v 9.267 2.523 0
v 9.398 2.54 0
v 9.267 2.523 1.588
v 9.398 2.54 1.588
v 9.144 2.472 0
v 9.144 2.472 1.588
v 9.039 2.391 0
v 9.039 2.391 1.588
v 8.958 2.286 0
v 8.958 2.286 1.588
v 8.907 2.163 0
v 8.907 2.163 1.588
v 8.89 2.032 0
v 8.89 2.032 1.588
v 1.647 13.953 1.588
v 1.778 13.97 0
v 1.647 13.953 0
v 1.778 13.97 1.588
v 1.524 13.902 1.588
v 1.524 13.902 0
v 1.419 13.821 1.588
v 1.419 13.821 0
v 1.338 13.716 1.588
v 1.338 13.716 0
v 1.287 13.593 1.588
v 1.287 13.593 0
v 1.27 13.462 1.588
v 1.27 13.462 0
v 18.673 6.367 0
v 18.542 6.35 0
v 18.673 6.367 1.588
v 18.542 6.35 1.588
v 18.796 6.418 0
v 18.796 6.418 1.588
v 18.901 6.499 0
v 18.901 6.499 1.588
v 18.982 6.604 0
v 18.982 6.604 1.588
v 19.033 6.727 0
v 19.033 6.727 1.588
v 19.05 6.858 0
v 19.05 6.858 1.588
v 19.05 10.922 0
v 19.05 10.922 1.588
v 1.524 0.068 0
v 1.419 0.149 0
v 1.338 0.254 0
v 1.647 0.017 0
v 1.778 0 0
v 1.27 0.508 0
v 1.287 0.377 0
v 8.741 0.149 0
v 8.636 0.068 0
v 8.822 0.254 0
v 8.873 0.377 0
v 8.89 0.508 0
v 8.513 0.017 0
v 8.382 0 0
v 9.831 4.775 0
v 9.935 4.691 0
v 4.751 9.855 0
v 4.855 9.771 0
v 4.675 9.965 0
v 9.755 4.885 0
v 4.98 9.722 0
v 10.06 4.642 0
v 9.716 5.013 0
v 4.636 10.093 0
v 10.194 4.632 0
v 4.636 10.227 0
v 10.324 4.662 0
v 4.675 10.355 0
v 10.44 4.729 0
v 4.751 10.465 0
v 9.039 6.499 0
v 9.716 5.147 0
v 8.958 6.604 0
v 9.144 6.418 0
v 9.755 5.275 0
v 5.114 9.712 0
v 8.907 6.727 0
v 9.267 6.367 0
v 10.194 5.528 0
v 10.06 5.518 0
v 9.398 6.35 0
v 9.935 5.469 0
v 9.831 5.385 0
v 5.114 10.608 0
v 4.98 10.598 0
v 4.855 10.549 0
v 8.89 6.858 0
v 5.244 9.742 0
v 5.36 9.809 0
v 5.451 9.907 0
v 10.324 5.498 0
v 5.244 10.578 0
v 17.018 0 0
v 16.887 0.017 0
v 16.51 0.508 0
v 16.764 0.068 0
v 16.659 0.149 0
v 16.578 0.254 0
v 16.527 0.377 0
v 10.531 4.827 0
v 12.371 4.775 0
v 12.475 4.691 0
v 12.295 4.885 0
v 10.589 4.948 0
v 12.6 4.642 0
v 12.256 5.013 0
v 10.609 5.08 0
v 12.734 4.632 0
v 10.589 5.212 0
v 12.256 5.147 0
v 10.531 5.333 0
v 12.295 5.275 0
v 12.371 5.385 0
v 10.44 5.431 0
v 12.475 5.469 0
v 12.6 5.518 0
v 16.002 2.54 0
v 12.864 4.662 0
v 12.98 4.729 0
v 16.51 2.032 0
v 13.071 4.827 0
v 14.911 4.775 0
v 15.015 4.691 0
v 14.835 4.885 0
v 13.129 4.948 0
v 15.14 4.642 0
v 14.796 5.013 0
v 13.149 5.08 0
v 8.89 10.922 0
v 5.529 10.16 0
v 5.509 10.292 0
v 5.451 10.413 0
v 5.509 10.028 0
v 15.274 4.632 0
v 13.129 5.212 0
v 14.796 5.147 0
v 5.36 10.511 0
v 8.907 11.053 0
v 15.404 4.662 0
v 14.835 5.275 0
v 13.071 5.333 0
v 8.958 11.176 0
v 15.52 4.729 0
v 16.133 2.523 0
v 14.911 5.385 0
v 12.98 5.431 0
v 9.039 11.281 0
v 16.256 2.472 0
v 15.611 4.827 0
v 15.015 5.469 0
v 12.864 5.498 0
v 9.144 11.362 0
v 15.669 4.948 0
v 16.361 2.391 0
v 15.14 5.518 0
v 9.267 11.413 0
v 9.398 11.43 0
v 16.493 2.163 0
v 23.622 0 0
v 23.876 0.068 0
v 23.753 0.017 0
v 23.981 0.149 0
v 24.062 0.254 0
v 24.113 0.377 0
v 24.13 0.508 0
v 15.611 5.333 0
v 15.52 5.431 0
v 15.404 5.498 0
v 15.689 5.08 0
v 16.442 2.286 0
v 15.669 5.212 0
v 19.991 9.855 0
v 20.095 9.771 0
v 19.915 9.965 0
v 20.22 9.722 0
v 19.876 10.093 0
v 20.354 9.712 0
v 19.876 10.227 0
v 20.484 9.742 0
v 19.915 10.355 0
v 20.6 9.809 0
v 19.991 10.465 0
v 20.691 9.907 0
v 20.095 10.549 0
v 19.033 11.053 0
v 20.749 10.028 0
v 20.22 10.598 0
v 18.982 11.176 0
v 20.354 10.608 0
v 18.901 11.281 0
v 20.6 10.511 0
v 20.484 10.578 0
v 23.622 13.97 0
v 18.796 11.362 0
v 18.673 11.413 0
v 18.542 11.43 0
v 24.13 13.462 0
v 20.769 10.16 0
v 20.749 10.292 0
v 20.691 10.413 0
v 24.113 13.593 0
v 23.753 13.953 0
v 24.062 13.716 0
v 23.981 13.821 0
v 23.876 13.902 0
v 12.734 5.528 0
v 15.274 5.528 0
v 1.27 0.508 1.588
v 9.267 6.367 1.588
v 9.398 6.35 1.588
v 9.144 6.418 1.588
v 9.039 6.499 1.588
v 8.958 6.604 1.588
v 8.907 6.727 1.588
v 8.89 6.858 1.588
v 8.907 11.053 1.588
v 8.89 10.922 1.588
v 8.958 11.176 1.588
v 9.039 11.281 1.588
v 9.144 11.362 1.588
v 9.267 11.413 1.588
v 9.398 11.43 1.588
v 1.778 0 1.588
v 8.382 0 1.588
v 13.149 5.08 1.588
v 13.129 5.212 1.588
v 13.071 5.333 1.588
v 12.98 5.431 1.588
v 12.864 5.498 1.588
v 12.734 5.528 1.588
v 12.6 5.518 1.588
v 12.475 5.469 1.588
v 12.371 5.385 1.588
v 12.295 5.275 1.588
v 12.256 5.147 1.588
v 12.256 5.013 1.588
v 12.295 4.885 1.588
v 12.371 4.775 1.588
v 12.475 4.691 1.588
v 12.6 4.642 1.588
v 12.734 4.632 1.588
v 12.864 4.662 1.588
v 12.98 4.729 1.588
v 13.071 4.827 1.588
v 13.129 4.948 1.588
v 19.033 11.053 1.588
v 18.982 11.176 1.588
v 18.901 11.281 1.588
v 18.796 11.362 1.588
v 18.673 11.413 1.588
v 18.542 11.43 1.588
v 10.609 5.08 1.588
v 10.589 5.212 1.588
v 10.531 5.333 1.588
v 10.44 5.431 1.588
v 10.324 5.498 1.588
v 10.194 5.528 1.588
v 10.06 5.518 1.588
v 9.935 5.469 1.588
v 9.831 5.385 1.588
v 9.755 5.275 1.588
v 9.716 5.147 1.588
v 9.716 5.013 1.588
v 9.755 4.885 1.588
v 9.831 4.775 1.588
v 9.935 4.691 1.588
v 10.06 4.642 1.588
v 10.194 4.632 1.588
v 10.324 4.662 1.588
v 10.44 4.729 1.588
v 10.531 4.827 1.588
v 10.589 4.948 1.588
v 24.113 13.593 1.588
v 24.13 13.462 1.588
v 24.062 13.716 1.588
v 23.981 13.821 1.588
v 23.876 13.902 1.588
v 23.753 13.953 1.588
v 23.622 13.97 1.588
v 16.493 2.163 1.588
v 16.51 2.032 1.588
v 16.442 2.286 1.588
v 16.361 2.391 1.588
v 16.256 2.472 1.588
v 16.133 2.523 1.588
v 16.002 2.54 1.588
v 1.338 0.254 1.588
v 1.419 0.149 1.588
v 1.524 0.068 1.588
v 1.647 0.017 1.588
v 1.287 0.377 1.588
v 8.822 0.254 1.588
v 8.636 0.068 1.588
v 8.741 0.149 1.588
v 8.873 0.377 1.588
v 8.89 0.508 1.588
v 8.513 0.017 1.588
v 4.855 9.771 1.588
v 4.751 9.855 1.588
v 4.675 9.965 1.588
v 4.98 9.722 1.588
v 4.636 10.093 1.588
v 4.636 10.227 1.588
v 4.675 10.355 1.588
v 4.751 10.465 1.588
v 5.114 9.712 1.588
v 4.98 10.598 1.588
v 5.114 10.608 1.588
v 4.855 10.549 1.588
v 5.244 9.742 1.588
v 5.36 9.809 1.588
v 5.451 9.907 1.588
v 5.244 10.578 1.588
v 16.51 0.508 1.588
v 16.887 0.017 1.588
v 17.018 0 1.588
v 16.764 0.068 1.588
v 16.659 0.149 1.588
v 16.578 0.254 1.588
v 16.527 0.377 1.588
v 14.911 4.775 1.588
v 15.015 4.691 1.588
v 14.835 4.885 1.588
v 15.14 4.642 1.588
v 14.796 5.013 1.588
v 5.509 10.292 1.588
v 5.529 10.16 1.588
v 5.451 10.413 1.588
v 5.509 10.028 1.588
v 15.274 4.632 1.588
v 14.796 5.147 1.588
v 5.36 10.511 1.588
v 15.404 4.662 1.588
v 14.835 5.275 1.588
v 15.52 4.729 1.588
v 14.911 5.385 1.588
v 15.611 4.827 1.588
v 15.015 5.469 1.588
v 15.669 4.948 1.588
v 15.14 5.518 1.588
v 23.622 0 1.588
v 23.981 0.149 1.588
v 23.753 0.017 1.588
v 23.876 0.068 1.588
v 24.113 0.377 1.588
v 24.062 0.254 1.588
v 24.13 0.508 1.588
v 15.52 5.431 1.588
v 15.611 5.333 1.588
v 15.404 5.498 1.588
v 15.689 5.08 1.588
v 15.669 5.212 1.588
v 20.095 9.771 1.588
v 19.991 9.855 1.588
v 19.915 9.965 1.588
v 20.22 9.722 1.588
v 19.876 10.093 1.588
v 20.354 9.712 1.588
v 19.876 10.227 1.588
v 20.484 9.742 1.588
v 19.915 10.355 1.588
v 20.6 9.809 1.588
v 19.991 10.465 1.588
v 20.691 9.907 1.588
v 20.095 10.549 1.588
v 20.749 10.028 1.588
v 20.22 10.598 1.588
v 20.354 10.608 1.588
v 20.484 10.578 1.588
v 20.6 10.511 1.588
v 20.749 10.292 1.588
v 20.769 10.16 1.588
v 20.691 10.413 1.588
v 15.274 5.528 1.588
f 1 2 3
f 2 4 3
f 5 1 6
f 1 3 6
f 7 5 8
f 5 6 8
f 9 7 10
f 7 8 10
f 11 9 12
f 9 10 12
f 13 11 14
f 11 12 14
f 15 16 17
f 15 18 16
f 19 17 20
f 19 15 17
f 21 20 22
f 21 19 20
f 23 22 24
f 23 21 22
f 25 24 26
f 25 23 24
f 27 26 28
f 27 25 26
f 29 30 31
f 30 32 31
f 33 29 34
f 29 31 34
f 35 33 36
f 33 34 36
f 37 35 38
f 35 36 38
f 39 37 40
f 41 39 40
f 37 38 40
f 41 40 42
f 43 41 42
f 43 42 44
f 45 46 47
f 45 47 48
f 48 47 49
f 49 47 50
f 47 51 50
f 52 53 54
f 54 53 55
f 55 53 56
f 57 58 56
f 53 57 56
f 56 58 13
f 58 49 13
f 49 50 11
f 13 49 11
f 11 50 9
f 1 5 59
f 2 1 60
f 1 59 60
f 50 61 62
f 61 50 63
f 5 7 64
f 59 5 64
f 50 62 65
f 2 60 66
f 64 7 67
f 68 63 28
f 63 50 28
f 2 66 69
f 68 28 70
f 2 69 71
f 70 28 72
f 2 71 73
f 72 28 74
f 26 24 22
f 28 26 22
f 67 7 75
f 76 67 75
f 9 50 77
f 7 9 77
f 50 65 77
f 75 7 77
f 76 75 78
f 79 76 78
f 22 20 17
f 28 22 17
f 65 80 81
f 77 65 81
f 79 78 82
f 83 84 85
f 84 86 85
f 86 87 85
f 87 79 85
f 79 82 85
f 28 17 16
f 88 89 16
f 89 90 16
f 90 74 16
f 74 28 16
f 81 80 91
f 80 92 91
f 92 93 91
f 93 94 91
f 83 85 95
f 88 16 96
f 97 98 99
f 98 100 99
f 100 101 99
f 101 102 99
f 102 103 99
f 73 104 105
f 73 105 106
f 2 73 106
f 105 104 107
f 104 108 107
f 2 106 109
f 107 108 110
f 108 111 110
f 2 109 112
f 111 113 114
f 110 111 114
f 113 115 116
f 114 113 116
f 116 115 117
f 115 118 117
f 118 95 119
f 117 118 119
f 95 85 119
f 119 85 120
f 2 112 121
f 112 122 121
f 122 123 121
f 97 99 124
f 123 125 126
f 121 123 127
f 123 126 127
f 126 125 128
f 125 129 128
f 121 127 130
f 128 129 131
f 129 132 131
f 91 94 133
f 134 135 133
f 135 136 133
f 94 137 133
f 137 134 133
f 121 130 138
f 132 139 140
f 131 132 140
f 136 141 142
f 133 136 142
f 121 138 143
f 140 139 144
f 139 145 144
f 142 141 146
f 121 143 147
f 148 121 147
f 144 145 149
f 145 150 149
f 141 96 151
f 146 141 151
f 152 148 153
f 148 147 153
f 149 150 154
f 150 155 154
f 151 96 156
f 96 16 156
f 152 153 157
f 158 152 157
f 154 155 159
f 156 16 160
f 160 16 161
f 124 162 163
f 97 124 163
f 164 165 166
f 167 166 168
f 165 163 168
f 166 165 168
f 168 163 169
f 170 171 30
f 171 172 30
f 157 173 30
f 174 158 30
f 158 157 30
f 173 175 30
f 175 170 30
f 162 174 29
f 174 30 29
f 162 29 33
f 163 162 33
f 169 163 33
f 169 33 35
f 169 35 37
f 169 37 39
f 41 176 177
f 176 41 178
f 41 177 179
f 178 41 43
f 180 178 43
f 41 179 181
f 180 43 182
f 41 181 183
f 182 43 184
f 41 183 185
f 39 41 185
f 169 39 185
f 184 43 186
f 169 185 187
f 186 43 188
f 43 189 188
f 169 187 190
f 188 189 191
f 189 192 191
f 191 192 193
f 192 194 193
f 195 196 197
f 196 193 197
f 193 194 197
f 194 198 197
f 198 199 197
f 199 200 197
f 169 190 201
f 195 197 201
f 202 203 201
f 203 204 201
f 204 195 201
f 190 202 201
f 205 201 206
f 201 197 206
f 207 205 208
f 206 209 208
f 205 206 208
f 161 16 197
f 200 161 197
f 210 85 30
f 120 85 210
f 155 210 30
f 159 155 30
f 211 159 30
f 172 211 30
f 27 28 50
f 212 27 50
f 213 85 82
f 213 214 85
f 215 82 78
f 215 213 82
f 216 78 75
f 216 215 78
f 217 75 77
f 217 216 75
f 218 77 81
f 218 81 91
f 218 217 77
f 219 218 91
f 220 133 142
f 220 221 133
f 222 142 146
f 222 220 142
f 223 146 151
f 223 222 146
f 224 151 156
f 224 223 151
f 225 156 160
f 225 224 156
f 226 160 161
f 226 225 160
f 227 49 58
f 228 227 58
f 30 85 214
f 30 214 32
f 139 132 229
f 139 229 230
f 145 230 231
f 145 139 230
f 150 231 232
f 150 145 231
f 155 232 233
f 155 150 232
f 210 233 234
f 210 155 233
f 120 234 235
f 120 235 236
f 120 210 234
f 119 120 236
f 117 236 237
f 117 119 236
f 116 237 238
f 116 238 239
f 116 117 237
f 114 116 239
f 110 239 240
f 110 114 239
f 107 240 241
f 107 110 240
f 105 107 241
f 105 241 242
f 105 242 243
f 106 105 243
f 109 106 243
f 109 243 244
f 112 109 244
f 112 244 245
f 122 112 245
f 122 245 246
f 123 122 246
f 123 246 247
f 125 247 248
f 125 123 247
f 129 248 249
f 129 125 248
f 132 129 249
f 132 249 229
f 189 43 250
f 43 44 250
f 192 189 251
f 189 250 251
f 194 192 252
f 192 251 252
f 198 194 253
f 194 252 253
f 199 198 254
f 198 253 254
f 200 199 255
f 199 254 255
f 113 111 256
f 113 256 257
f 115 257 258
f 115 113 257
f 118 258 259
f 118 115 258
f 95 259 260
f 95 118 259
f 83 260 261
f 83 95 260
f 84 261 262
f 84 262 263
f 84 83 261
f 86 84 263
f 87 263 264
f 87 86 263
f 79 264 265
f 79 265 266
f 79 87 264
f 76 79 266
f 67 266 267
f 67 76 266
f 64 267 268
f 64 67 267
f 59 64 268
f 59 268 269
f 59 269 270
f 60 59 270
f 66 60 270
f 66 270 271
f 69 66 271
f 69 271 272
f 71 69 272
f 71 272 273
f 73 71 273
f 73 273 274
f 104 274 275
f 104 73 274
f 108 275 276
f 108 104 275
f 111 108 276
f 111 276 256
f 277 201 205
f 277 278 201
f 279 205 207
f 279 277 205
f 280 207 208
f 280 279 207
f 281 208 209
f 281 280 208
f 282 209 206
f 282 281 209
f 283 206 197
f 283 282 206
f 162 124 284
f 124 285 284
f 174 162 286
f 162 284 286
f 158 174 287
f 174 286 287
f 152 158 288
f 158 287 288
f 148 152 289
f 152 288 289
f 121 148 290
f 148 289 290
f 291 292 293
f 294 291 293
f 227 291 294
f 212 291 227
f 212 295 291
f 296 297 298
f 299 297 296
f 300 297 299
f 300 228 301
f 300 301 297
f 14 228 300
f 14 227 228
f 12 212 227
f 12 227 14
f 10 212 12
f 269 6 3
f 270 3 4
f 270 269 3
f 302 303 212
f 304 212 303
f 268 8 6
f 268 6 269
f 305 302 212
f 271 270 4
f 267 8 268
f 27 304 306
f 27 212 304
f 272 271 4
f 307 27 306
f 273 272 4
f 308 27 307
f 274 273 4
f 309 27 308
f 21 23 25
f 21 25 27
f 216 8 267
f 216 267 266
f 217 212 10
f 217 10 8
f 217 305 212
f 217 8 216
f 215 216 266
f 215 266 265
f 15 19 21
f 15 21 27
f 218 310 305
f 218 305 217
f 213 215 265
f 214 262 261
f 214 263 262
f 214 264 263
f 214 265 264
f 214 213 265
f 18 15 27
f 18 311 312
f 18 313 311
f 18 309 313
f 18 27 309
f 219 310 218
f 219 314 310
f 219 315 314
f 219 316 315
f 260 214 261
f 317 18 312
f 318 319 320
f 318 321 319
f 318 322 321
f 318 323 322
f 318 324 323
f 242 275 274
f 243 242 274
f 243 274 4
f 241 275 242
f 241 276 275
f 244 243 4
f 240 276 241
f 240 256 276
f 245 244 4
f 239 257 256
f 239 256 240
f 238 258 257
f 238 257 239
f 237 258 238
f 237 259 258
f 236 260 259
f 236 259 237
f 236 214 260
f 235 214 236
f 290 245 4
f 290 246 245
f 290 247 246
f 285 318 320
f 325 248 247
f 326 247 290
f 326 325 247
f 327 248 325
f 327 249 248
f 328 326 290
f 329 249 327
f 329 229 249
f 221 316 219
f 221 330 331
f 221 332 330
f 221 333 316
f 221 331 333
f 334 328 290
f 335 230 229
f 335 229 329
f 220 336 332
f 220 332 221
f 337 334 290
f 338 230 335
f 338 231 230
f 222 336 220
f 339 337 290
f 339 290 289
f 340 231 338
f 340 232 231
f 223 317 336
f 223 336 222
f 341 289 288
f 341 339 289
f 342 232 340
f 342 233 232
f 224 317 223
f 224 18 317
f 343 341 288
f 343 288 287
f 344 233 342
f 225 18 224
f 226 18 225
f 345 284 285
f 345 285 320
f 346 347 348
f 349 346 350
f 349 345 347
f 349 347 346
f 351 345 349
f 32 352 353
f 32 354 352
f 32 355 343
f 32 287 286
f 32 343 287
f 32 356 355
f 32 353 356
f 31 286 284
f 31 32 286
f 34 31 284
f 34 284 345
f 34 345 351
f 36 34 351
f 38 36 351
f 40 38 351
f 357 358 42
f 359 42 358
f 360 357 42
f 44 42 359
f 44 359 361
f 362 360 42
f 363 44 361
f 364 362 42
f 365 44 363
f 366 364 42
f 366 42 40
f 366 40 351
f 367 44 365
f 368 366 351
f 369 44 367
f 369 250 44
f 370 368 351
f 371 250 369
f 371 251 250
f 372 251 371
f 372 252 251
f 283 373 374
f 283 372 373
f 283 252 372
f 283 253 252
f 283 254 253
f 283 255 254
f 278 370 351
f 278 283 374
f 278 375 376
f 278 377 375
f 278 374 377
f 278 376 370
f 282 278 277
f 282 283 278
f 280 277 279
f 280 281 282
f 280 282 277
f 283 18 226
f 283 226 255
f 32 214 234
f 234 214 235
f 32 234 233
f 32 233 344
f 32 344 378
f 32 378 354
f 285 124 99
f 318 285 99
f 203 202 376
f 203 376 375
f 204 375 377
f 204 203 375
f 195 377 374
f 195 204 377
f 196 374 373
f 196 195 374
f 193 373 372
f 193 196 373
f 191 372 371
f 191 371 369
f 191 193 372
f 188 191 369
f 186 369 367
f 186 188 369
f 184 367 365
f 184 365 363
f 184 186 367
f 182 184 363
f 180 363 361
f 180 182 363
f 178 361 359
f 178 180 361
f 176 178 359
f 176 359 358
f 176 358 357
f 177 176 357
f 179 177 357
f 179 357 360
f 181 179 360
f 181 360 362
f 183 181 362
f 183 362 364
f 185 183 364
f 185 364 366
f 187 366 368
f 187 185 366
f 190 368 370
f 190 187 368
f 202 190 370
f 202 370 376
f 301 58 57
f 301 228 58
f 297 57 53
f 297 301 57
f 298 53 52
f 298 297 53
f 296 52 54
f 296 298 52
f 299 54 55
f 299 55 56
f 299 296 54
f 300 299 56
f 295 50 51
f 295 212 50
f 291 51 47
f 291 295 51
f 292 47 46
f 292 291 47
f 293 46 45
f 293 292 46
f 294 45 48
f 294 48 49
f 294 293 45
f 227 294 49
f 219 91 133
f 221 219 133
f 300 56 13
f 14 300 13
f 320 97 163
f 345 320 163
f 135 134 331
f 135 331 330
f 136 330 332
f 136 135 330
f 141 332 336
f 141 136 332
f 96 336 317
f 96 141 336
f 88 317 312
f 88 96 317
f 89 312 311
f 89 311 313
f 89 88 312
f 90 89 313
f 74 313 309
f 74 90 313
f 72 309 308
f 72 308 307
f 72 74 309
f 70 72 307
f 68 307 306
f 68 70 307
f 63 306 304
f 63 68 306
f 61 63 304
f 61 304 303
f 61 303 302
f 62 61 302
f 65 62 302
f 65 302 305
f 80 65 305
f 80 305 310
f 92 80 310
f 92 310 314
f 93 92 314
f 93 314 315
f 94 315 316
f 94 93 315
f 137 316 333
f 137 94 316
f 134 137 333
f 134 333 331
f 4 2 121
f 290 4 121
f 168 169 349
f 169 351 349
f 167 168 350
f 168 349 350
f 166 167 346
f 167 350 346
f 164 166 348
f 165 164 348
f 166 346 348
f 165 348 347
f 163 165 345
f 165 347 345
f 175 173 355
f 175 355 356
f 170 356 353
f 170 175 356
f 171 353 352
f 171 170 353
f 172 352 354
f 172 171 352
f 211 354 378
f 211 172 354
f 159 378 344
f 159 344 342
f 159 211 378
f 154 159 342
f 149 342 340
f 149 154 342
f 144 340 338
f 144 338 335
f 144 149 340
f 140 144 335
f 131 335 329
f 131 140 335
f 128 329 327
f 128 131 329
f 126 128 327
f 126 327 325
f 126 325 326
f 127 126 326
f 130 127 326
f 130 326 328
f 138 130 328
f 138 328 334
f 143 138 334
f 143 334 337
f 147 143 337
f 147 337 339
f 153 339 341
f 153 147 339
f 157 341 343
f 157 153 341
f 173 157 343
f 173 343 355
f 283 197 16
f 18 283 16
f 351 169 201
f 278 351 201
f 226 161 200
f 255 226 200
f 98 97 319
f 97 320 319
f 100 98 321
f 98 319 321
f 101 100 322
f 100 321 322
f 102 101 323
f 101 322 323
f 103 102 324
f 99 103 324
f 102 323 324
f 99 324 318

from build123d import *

# Parameters (mm, degrees)
F0_R     = 0.4490128061
F0_W     = 10.16
F0_H     = 5.08
F3_DEPTH = 1.5875
F4_R     = 0.508


with BuildPart() as f3:
    # F0 (on Top) → F3 (new body)
    with BuildSketch(Plane.XY):
        Polygon((24.13, 0), (24.13, 13.97), (1.27, 13.97), (1.27, 0), (8.89, 0), (8.89, 2.54), (16.51, 2.54), (16.51, 0), align=None)
        with Locations((10.16, 5.08)):
            Circle(F0_R, mode=Mode.SUBTRACT)
        with Locations((12.7, 5.08)):
            Circle(F0_R, mode=Mode.SUBTRACT)
        with Locations((15.24, 5.08)):
            Circle(F0_R, mode=Mode.SUBTRACT)
        with Locations((5.08, 10.16)):
            Circle(F0_R, mode=Mode.SUBTRACT)
        with Locations((13.97, 8.89)):
            Rectangle(F0_W, F0_H, mode=Mode.SUBTRACT)
        with Locations((20.32, 10.16)):
            Circle(F0_R, mode=Mode.SUBTRACT)
    extrude(amount=F3_DEPTH)

    # F4
    f4_edges = [f3.edges().sort_by_distance(p)[0] for p in [
        (1.27, 0, 0.79375),
        (8.89, 0, 0.79375),
        (16.51, 2.54, 0.79375),
        (16.51, 0, 0.79375),
        (24.13, 0, 0.79375),
        (8.89, 11.43, 0.79375),
        (8.89, 2.54, 0.79375),
        (24.13, 13.97, 0.79375),
        (8.89, 6.35, 0.79375),
        (1.27, 13.97, 0.79375),
        (19.05, 6.35, 0.79375),
        (19.05, 11.43, 0.79375),
    ]]
    fillet(f4_edges, radius=F4_R)


solid = f3.part
